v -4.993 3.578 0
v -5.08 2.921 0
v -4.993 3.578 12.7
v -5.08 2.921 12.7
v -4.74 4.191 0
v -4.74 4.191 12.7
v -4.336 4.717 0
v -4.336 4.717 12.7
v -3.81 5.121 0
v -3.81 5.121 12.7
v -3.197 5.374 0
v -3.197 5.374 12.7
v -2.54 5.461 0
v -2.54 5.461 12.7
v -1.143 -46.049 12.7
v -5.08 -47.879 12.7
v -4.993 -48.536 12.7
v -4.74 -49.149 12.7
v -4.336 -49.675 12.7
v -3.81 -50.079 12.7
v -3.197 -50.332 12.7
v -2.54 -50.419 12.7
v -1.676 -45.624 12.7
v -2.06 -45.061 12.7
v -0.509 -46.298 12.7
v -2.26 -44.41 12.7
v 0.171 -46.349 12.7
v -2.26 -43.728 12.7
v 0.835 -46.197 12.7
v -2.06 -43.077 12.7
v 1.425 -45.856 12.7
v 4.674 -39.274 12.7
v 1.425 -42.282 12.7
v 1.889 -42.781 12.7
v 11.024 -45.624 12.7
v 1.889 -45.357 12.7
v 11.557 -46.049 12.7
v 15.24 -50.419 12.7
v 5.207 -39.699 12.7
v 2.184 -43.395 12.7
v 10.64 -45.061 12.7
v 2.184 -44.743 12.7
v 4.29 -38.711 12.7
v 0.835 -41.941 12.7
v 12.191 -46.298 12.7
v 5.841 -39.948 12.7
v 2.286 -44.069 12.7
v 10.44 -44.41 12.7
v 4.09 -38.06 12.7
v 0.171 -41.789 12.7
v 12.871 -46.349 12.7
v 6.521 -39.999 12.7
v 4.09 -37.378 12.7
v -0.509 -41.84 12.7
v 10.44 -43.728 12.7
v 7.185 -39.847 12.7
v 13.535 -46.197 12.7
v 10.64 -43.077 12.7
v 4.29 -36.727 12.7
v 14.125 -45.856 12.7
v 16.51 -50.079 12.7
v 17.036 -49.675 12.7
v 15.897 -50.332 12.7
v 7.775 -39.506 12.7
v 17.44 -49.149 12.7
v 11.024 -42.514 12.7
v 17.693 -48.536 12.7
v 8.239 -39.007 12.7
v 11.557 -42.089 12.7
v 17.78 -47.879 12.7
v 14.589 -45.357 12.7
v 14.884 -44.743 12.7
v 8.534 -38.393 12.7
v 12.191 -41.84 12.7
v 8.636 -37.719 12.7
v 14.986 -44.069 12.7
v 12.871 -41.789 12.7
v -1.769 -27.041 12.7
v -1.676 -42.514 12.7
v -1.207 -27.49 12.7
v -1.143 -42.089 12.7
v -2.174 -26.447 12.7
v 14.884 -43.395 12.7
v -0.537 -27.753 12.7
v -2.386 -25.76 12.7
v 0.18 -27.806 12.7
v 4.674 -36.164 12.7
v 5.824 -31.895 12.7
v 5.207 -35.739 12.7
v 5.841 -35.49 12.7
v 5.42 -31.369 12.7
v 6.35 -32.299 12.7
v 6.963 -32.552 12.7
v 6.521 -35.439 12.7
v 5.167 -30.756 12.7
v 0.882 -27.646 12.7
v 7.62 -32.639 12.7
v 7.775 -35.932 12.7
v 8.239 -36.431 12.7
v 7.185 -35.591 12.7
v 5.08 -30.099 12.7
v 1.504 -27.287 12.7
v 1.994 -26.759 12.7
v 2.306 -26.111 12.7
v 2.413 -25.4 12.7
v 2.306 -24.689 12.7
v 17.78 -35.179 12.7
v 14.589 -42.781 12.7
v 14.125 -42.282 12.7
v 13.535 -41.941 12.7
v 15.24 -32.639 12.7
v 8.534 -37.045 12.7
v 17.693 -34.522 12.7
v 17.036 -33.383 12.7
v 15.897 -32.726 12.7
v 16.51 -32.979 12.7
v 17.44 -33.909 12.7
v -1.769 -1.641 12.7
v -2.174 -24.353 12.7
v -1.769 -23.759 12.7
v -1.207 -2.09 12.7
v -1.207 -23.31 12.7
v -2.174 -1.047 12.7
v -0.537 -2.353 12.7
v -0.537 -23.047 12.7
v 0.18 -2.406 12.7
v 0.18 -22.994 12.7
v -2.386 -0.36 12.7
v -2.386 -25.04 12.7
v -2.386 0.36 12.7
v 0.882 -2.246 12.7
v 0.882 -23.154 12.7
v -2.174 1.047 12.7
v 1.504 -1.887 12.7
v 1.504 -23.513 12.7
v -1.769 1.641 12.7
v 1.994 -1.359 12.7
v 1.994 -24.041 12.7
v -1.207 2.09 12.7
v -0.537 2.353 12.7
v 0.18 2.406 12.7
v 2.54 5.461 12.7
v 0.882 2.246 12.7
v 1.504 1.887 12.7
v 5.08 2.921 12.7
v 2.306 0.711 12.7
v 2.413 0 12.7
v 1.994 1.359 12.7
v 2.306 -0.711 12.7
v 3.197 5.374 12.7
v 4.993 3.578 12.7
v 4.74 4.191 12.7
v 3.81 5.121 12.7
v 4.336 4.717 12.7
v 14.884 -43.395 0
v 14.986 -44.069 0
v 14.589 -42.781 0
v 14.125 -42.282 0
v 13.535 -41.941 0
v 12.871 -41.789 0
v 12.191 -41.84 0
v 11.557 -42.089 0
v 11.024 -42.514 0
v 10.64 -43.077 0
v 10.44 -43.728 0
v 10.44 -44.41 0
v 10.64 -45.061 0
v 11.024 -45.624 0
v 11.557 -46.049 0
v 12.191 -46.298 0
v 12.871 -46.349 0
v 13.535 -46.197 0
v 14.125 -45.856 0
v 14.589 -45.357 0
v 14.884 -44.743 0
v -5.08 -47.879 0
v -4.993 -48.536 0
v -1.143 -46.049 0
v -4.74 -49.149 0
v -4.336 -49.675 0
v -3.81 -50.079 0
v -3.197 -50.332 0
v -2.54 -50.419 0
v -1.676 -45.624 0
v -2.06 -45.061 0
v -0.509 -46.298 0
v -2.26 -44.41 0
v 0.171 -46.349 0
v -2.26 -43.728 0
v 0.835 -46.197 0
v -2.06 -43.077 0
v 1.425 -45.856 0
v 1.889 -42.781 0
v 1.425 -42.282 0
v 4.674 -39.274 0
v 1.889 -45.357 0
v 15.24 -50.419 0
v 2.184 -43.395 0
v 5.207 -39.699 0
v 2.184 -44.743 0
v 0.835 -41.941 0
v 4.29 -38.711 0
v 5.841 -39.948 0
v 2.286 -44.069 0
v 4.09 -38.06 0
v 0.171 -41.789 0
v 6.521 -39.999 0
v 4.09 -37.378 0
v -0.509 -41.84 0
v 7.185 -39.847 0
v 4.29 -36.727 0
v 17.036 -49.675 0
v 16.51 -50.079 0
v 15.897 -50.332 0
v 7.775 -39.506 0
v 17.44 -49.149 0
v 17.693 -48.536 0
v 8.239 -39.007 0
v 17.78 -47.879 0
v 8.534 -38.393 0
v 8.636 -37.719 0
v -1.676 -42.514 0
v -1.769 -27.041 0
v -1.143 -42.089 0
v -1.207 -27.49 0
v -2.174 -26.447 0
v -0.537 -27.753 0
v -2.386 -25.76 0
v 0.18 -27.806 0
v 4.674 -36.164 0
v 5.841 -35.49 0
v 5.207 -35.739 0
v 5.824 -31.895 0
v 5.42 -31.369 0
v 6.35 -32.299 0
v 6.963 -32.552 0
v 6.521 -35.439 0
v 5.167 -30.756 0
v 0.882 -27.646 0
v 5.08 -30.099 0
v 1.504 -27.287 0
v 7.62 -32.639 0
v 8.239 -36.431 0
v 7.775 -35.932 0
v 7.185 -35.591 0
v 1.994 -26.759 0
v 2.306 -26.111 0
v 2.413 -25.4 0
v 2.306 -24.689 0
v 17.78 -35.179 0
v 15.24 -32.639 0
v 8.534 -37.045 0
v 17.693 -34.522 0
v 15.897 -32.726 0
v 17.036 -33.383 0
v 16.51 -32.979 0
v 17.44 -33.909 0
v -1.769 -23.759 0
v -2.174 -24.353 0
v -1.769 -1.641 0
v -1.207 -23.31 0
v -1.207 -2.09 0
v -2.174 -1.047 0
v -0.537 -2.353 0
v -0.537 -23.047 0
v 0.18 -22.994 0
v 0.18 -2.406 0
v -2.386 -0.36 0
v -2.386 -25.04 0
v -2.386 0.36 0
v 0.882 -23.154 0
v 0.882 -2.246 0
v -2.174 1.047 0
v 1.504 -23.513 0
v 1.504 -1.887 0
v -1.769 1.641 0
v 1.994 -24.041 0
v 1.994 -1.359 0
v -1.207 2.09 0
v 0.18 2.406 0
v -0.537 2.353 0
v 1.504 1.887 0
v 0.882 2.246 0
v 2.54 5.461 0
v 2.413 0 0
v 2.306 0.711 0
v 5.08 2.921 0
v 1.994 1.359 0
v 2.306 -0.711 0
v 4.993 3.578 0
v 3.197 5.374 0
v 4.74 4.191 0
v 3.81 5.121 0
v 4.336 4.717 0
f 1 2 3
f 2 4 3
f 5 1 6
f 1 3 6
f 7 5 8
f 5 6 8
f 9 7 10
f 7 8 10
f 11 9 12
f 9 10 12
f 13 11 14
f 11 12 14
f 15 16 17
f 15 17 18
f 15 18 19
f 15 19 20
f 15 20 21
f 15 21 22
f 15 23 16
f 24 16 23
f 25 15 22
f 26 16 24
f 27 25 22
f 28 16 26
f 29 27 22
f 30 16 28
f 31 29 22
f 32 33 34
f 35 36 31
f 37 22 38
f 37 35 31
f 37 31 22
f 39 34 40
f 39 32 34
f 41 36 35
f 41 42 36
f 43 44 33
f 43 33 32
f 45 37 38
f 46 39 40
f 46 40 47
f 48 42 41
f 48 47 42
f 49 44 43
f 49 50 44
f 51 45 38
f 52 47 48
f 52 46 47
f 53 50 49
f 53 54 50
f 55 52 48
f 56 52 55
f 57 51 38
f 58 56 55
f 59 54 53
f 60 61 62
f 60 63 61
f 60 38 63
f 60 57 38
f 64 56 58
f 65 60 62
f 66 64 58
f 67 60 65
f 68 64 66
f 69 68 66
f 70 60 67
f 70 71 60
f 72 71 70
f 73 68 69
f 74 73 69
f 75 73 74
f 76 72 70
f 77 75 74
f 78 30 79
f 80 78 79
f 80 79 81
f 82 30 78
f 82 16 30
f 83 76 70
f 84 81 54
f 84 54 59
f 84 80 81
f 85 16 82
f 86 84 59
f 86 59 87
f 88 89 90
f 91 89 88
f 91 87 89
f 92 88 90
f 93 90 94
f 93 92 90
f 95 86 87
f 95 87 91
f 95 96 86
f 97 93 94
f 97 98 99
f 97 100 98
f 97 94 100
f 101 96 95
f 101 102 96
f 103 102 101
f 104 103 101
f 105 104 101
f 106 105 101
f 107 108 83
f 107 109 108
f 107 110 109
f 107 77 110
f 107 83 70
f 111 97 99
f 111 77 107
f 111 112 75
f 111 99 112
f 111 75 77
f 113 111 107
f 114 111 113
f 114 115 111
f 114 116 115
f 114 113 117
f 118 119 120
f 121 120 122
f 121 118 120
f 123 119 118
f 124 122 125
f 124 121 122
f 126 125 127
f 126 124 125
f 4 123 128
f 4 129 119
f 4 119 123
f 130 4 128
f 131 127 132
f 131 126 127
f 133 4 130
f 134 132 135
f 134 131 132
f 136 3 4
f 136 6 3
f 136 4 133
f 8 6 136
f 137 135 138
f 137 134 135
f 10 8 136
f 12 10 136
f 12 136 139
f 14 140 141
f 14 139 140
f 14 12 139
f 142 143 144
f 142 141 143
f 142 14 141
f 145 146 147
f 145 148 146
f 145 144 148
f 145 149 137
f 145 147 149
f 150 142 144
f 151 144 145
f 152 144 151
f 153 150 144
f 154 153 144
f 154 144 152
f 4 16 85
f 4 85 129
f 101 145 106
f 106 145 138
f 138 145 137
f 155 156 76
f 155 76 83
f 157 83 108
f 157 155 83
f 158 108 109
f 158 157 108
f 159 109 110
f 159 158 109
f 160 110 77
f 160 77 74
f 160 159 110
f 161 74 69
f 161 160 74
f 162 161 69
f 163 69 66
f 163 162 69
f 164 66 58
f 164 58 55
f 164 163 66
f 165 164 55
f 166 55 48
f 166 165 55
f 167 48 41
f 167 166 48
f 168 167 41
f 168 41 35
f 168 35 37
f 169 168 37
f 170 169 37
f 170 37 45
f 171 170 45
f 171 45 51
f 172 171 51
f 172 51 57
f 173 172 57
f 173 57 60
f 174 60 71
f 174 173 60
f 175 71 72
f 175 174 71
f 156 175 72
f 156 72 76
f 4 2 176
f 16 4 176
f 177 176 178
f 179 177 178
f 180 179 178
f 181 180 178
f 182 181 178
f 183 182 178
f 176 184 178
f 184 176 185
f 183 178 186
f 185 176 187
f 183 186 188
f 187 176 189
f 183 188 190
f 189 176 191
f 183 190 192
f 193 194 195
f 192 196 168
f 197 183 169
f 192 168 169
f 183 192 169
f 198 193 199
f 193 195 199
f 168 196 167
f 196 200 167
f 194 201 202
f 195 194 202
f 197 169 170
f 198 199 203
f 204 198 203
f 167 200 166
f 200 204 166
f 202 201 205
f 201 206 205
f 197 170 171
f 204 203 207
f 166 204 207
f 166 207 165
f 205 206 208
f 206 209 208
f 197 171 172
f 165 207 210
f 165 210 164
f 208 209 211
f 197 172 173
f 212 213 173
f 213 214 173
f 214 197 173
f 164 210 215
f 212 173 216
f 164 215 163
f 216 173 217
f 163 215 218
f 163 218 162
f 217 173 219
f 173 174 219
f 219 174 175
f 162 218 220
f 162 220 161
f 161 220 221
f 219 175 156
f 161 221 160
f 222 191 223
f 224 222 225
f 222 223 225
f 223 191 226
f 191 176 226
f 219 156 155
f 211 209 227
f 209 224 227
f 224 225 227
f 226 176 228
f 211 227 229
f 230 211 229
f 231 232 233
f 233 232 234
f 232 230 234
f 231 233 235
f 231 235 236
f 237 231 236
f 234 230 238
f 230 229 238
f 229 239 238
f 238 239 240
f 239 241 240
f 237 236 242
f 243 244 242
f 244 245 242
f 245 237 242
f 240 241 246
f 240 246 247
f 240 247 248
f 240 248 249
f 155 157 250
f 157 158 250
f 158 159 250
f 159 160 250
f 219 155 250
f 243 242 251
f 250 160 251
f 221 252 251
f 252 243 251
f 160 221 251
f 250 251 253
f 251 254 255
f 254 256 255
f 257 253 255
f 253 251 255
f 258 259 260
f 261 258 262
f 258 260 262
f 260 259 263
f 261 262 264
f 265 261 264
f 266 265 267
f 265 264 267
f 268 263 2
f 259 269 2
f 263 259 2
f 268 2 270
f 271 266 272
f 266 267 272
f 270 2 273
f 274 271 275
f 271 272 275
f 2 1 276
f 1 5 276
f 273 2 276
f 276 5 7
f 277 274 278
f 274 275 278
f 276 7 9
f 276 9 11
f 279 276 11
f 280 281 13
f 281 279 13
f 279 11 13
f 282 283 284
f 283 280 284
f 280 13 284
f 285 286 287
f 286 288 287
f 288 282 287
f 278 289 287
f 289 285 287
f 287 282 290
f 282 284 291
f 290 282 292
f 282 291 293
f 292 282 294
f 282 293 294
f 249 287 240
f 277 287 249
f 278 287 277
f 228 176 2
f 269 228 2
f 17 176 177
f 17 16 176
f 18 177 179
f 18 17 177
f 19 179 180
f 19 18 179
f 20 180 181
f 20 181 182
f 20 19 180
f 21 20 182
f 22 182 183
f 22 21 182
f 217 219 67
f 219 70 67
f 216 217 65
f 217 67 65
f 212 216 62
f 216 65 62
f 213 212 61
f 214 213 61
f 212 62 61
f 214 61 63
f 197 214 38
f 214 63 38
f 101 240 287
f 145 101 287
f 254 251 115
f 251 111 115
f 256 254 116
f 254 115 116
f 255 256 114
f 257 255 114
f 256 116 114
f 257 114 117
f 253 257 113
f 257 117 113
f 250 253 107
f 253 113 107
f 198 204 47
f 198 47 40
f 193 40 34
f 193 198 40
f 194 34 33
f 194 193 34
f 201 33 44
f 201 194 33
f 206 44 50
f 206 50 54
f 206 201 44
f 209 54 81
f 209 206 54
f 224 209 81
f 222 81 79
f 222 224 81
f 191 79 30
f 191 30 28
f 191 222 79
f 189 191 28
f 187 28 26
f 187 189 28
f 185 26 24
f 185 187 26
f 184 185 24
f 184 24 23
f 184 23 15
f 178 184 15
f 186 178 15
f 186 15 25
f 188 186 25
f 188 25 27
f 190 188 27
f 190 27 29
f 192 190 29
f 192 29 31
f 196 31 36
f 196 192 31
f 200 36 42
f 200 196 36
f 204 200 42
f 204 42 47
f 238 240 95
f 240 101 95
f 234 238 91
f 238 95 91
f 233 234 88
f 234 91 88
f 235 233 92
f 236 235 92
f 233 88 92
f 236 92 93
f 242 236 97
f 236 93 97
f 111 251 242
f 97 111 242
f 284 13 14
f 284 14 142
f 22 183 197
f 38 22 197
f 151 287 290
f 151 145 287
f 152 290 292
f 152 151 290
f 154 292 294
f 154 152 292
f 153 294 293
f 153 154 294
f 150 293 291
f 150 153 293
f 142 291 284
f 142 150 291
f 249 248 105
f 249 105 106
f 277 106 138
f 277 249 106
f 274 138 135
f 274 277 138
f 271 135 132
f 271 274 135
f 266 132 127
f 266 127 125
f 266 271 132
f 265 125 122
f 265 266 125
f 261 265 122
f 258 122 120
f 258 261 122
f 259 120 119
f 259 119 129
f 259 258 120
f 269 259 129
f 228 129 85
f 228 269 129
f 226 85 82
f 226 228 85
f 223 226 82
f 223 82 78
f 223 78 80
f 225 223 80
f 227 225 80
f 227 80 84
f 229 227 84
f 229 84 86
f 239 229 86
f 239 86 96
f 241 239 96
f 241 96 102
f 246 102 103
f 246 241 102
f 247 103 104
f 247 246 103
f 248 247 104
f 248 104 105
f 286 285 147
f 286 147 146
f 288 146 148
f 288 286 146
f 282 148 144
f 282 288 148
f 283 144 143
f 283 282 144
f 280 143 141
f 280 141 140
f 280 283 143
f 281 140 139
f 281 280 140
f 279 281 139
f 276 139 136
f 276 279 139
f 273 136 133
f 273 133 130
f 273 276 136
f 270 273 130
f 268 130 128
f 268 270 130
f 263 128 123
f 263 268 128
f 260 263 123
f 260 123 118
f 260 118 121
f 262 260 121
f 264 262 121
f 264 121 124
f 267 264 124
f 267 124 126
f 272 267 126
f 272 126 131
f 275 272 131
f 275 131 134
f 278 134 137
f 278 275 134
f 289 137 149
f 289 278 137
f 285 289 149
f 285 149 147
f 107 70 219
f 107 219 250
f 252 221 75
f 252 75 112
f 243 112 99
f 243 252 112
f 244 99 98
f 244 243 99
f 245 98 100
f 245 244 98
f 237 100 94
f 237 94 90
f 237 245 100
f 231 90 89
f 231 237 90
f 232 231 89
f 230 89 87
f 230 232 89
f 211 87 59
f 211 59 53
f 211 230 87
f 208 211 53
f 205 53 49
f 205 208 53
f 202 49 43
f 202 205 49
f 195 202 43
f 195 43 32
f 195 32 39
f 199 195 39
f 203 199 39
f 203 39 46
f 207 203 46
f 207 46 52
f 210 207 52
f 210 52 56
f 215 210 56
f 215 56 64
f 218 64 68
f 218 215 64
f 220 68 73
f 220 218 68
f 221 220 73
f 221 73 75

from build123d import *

# Parameters (mm, degrees)
SKETCH1_W           = 10.16
SKETCH1_H           = 38.1
SKETCH1_R           = 2.413
SKETCH1_R_2         = 2.286
BOSS_EXTRUDE1_DEPTH = 12.7
FILLET1_R           = 2.54


with BuildPart() as part:
    # Sketch1 → Boss-Extrude1 (new body)
    # profile 1 of 2: a face of its own
    with BuildSketch(Plane.XY):
        with Locations((0, -13.589)):
            Rectangle(SKETCH1_W, SKETCH1_H)
        with Locations((0, -25.4)):
            Circle(SKETCH1_R, mode=Mode.SUBTRACT)
        Circle(SKETCH1_R, mode=Mode.SUBTRACT)
    # profile 2 of 2: a face of its own
    with BuildSketch(Plane.XY):
        Polygon((5.08, -32.639), (-5.08, -32.639), (-5.08, -50.419), (17.78, -50.419), (17.78, -32.639), align=None)
        with Locations((0, -44.069)):
            Circle(SKETCH1_R_2, mode=Mode.SUBTRACT)
        with Locations((6.35, -37.719)):
            Circle(SKETCH1_R_2, mode=Mode.SUBTRACT)
        with Locations((12.7, -44.069)):
            Circle(SKETCH1_R_2, mode=Mode.SUBTRACT)
    extrude(amount=BOSS_EXTRUDE1_DEPTH)

    # Fillet1
    fillet1_edges = [part.edges().sort_by_distance(p)[0] for p in [
        (17.78, -50.419, 6.35),
        (-5.08, -50.419, 6.35),
        (-5.08, 5.461, 6.35),
        (5.08, 5.461, 6.35),
        (5.08, -32.639, 6.35),
        (17.78, -32.639, 6.35),
    ]]
    fillet(fillet1_edges, radius=FILLET1_R)


solid = part.part
